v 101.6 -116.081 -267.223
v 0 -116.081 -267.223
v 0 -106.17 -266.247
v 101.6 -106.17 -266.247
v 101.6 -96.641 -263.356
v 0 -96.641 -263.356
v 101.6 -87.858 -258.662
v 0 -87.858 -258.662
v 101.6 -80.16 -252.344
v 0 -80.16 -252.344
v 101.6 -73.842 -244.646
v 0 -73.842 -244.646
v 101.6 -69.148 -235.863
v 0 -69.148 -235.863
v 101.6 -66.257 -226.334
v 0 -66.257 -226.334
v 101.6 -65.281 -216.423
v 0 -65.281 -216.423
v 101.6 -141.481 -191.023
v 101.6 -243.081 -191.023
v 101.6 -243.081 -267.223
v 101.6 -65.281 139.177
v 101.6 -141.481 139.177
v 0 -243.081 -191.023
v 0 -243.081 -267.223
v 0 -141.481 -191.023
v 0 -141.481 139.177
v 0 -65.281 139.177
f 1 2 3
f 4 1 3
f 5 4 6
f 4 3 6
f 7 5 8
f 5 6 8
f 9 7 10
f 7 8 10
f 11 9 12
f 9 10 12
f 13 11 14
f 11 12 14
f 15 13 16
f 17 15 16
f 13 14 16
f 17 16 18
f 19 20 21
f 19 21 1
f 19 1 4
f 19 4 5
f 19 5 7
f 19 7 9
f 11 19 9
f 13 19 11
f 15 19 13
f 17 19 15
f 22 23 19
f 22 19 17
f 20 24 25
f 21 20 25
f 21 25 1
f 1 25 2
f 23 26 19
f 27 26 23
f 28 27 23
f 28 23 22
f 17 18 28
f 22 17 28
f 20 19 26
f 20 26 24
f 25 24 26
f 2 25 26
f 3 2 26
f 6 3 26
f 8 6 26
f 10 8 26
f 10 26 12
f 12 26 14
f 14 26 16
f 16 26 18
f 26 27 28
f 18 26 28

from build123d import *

# Parameters (mm, degrees)
F0_W     = 76.2
F0_H     = 330.2
F1_DEPTH = 101.6


# Not quite as in the source:
# - a feature of the source that left no trace in its solid (it failed there, or was rolled back) is left out


with BuildPart() as f1:
    # F0 (on Right) → F1 (new body)
    with BuildSketch(Plane.YZ):
        with Locations((-103.380974756, -25.9231243968)):
            Rectangle(F0_W, F0_H)
        with BuildLine():
            Line((-65.280974756, -191.0231243968), (-141.480974756, -191.0231243968))
            Line((-141.480974756, -191.0231243968), (-243.080974756, -191.0231243968))
            Line((-243.080974756, -191.0231243968), (-243.080974756, -267.2231243968))
            Line((-243.080974756, -267.2231243968), (-116.080974756, -267.2231243968))
            ThreePointArc((-116.080974756, -267.2231243968), (-80.1599502717, -252.3441488811), (-65.280974756, -216.4231243968))
            Line((-65.280974756, -216.4231243968), (-65.280974756, -191.0231243968))
        make_face()
    extrude(amount=F1_DEPTH)


solid = f1.part
